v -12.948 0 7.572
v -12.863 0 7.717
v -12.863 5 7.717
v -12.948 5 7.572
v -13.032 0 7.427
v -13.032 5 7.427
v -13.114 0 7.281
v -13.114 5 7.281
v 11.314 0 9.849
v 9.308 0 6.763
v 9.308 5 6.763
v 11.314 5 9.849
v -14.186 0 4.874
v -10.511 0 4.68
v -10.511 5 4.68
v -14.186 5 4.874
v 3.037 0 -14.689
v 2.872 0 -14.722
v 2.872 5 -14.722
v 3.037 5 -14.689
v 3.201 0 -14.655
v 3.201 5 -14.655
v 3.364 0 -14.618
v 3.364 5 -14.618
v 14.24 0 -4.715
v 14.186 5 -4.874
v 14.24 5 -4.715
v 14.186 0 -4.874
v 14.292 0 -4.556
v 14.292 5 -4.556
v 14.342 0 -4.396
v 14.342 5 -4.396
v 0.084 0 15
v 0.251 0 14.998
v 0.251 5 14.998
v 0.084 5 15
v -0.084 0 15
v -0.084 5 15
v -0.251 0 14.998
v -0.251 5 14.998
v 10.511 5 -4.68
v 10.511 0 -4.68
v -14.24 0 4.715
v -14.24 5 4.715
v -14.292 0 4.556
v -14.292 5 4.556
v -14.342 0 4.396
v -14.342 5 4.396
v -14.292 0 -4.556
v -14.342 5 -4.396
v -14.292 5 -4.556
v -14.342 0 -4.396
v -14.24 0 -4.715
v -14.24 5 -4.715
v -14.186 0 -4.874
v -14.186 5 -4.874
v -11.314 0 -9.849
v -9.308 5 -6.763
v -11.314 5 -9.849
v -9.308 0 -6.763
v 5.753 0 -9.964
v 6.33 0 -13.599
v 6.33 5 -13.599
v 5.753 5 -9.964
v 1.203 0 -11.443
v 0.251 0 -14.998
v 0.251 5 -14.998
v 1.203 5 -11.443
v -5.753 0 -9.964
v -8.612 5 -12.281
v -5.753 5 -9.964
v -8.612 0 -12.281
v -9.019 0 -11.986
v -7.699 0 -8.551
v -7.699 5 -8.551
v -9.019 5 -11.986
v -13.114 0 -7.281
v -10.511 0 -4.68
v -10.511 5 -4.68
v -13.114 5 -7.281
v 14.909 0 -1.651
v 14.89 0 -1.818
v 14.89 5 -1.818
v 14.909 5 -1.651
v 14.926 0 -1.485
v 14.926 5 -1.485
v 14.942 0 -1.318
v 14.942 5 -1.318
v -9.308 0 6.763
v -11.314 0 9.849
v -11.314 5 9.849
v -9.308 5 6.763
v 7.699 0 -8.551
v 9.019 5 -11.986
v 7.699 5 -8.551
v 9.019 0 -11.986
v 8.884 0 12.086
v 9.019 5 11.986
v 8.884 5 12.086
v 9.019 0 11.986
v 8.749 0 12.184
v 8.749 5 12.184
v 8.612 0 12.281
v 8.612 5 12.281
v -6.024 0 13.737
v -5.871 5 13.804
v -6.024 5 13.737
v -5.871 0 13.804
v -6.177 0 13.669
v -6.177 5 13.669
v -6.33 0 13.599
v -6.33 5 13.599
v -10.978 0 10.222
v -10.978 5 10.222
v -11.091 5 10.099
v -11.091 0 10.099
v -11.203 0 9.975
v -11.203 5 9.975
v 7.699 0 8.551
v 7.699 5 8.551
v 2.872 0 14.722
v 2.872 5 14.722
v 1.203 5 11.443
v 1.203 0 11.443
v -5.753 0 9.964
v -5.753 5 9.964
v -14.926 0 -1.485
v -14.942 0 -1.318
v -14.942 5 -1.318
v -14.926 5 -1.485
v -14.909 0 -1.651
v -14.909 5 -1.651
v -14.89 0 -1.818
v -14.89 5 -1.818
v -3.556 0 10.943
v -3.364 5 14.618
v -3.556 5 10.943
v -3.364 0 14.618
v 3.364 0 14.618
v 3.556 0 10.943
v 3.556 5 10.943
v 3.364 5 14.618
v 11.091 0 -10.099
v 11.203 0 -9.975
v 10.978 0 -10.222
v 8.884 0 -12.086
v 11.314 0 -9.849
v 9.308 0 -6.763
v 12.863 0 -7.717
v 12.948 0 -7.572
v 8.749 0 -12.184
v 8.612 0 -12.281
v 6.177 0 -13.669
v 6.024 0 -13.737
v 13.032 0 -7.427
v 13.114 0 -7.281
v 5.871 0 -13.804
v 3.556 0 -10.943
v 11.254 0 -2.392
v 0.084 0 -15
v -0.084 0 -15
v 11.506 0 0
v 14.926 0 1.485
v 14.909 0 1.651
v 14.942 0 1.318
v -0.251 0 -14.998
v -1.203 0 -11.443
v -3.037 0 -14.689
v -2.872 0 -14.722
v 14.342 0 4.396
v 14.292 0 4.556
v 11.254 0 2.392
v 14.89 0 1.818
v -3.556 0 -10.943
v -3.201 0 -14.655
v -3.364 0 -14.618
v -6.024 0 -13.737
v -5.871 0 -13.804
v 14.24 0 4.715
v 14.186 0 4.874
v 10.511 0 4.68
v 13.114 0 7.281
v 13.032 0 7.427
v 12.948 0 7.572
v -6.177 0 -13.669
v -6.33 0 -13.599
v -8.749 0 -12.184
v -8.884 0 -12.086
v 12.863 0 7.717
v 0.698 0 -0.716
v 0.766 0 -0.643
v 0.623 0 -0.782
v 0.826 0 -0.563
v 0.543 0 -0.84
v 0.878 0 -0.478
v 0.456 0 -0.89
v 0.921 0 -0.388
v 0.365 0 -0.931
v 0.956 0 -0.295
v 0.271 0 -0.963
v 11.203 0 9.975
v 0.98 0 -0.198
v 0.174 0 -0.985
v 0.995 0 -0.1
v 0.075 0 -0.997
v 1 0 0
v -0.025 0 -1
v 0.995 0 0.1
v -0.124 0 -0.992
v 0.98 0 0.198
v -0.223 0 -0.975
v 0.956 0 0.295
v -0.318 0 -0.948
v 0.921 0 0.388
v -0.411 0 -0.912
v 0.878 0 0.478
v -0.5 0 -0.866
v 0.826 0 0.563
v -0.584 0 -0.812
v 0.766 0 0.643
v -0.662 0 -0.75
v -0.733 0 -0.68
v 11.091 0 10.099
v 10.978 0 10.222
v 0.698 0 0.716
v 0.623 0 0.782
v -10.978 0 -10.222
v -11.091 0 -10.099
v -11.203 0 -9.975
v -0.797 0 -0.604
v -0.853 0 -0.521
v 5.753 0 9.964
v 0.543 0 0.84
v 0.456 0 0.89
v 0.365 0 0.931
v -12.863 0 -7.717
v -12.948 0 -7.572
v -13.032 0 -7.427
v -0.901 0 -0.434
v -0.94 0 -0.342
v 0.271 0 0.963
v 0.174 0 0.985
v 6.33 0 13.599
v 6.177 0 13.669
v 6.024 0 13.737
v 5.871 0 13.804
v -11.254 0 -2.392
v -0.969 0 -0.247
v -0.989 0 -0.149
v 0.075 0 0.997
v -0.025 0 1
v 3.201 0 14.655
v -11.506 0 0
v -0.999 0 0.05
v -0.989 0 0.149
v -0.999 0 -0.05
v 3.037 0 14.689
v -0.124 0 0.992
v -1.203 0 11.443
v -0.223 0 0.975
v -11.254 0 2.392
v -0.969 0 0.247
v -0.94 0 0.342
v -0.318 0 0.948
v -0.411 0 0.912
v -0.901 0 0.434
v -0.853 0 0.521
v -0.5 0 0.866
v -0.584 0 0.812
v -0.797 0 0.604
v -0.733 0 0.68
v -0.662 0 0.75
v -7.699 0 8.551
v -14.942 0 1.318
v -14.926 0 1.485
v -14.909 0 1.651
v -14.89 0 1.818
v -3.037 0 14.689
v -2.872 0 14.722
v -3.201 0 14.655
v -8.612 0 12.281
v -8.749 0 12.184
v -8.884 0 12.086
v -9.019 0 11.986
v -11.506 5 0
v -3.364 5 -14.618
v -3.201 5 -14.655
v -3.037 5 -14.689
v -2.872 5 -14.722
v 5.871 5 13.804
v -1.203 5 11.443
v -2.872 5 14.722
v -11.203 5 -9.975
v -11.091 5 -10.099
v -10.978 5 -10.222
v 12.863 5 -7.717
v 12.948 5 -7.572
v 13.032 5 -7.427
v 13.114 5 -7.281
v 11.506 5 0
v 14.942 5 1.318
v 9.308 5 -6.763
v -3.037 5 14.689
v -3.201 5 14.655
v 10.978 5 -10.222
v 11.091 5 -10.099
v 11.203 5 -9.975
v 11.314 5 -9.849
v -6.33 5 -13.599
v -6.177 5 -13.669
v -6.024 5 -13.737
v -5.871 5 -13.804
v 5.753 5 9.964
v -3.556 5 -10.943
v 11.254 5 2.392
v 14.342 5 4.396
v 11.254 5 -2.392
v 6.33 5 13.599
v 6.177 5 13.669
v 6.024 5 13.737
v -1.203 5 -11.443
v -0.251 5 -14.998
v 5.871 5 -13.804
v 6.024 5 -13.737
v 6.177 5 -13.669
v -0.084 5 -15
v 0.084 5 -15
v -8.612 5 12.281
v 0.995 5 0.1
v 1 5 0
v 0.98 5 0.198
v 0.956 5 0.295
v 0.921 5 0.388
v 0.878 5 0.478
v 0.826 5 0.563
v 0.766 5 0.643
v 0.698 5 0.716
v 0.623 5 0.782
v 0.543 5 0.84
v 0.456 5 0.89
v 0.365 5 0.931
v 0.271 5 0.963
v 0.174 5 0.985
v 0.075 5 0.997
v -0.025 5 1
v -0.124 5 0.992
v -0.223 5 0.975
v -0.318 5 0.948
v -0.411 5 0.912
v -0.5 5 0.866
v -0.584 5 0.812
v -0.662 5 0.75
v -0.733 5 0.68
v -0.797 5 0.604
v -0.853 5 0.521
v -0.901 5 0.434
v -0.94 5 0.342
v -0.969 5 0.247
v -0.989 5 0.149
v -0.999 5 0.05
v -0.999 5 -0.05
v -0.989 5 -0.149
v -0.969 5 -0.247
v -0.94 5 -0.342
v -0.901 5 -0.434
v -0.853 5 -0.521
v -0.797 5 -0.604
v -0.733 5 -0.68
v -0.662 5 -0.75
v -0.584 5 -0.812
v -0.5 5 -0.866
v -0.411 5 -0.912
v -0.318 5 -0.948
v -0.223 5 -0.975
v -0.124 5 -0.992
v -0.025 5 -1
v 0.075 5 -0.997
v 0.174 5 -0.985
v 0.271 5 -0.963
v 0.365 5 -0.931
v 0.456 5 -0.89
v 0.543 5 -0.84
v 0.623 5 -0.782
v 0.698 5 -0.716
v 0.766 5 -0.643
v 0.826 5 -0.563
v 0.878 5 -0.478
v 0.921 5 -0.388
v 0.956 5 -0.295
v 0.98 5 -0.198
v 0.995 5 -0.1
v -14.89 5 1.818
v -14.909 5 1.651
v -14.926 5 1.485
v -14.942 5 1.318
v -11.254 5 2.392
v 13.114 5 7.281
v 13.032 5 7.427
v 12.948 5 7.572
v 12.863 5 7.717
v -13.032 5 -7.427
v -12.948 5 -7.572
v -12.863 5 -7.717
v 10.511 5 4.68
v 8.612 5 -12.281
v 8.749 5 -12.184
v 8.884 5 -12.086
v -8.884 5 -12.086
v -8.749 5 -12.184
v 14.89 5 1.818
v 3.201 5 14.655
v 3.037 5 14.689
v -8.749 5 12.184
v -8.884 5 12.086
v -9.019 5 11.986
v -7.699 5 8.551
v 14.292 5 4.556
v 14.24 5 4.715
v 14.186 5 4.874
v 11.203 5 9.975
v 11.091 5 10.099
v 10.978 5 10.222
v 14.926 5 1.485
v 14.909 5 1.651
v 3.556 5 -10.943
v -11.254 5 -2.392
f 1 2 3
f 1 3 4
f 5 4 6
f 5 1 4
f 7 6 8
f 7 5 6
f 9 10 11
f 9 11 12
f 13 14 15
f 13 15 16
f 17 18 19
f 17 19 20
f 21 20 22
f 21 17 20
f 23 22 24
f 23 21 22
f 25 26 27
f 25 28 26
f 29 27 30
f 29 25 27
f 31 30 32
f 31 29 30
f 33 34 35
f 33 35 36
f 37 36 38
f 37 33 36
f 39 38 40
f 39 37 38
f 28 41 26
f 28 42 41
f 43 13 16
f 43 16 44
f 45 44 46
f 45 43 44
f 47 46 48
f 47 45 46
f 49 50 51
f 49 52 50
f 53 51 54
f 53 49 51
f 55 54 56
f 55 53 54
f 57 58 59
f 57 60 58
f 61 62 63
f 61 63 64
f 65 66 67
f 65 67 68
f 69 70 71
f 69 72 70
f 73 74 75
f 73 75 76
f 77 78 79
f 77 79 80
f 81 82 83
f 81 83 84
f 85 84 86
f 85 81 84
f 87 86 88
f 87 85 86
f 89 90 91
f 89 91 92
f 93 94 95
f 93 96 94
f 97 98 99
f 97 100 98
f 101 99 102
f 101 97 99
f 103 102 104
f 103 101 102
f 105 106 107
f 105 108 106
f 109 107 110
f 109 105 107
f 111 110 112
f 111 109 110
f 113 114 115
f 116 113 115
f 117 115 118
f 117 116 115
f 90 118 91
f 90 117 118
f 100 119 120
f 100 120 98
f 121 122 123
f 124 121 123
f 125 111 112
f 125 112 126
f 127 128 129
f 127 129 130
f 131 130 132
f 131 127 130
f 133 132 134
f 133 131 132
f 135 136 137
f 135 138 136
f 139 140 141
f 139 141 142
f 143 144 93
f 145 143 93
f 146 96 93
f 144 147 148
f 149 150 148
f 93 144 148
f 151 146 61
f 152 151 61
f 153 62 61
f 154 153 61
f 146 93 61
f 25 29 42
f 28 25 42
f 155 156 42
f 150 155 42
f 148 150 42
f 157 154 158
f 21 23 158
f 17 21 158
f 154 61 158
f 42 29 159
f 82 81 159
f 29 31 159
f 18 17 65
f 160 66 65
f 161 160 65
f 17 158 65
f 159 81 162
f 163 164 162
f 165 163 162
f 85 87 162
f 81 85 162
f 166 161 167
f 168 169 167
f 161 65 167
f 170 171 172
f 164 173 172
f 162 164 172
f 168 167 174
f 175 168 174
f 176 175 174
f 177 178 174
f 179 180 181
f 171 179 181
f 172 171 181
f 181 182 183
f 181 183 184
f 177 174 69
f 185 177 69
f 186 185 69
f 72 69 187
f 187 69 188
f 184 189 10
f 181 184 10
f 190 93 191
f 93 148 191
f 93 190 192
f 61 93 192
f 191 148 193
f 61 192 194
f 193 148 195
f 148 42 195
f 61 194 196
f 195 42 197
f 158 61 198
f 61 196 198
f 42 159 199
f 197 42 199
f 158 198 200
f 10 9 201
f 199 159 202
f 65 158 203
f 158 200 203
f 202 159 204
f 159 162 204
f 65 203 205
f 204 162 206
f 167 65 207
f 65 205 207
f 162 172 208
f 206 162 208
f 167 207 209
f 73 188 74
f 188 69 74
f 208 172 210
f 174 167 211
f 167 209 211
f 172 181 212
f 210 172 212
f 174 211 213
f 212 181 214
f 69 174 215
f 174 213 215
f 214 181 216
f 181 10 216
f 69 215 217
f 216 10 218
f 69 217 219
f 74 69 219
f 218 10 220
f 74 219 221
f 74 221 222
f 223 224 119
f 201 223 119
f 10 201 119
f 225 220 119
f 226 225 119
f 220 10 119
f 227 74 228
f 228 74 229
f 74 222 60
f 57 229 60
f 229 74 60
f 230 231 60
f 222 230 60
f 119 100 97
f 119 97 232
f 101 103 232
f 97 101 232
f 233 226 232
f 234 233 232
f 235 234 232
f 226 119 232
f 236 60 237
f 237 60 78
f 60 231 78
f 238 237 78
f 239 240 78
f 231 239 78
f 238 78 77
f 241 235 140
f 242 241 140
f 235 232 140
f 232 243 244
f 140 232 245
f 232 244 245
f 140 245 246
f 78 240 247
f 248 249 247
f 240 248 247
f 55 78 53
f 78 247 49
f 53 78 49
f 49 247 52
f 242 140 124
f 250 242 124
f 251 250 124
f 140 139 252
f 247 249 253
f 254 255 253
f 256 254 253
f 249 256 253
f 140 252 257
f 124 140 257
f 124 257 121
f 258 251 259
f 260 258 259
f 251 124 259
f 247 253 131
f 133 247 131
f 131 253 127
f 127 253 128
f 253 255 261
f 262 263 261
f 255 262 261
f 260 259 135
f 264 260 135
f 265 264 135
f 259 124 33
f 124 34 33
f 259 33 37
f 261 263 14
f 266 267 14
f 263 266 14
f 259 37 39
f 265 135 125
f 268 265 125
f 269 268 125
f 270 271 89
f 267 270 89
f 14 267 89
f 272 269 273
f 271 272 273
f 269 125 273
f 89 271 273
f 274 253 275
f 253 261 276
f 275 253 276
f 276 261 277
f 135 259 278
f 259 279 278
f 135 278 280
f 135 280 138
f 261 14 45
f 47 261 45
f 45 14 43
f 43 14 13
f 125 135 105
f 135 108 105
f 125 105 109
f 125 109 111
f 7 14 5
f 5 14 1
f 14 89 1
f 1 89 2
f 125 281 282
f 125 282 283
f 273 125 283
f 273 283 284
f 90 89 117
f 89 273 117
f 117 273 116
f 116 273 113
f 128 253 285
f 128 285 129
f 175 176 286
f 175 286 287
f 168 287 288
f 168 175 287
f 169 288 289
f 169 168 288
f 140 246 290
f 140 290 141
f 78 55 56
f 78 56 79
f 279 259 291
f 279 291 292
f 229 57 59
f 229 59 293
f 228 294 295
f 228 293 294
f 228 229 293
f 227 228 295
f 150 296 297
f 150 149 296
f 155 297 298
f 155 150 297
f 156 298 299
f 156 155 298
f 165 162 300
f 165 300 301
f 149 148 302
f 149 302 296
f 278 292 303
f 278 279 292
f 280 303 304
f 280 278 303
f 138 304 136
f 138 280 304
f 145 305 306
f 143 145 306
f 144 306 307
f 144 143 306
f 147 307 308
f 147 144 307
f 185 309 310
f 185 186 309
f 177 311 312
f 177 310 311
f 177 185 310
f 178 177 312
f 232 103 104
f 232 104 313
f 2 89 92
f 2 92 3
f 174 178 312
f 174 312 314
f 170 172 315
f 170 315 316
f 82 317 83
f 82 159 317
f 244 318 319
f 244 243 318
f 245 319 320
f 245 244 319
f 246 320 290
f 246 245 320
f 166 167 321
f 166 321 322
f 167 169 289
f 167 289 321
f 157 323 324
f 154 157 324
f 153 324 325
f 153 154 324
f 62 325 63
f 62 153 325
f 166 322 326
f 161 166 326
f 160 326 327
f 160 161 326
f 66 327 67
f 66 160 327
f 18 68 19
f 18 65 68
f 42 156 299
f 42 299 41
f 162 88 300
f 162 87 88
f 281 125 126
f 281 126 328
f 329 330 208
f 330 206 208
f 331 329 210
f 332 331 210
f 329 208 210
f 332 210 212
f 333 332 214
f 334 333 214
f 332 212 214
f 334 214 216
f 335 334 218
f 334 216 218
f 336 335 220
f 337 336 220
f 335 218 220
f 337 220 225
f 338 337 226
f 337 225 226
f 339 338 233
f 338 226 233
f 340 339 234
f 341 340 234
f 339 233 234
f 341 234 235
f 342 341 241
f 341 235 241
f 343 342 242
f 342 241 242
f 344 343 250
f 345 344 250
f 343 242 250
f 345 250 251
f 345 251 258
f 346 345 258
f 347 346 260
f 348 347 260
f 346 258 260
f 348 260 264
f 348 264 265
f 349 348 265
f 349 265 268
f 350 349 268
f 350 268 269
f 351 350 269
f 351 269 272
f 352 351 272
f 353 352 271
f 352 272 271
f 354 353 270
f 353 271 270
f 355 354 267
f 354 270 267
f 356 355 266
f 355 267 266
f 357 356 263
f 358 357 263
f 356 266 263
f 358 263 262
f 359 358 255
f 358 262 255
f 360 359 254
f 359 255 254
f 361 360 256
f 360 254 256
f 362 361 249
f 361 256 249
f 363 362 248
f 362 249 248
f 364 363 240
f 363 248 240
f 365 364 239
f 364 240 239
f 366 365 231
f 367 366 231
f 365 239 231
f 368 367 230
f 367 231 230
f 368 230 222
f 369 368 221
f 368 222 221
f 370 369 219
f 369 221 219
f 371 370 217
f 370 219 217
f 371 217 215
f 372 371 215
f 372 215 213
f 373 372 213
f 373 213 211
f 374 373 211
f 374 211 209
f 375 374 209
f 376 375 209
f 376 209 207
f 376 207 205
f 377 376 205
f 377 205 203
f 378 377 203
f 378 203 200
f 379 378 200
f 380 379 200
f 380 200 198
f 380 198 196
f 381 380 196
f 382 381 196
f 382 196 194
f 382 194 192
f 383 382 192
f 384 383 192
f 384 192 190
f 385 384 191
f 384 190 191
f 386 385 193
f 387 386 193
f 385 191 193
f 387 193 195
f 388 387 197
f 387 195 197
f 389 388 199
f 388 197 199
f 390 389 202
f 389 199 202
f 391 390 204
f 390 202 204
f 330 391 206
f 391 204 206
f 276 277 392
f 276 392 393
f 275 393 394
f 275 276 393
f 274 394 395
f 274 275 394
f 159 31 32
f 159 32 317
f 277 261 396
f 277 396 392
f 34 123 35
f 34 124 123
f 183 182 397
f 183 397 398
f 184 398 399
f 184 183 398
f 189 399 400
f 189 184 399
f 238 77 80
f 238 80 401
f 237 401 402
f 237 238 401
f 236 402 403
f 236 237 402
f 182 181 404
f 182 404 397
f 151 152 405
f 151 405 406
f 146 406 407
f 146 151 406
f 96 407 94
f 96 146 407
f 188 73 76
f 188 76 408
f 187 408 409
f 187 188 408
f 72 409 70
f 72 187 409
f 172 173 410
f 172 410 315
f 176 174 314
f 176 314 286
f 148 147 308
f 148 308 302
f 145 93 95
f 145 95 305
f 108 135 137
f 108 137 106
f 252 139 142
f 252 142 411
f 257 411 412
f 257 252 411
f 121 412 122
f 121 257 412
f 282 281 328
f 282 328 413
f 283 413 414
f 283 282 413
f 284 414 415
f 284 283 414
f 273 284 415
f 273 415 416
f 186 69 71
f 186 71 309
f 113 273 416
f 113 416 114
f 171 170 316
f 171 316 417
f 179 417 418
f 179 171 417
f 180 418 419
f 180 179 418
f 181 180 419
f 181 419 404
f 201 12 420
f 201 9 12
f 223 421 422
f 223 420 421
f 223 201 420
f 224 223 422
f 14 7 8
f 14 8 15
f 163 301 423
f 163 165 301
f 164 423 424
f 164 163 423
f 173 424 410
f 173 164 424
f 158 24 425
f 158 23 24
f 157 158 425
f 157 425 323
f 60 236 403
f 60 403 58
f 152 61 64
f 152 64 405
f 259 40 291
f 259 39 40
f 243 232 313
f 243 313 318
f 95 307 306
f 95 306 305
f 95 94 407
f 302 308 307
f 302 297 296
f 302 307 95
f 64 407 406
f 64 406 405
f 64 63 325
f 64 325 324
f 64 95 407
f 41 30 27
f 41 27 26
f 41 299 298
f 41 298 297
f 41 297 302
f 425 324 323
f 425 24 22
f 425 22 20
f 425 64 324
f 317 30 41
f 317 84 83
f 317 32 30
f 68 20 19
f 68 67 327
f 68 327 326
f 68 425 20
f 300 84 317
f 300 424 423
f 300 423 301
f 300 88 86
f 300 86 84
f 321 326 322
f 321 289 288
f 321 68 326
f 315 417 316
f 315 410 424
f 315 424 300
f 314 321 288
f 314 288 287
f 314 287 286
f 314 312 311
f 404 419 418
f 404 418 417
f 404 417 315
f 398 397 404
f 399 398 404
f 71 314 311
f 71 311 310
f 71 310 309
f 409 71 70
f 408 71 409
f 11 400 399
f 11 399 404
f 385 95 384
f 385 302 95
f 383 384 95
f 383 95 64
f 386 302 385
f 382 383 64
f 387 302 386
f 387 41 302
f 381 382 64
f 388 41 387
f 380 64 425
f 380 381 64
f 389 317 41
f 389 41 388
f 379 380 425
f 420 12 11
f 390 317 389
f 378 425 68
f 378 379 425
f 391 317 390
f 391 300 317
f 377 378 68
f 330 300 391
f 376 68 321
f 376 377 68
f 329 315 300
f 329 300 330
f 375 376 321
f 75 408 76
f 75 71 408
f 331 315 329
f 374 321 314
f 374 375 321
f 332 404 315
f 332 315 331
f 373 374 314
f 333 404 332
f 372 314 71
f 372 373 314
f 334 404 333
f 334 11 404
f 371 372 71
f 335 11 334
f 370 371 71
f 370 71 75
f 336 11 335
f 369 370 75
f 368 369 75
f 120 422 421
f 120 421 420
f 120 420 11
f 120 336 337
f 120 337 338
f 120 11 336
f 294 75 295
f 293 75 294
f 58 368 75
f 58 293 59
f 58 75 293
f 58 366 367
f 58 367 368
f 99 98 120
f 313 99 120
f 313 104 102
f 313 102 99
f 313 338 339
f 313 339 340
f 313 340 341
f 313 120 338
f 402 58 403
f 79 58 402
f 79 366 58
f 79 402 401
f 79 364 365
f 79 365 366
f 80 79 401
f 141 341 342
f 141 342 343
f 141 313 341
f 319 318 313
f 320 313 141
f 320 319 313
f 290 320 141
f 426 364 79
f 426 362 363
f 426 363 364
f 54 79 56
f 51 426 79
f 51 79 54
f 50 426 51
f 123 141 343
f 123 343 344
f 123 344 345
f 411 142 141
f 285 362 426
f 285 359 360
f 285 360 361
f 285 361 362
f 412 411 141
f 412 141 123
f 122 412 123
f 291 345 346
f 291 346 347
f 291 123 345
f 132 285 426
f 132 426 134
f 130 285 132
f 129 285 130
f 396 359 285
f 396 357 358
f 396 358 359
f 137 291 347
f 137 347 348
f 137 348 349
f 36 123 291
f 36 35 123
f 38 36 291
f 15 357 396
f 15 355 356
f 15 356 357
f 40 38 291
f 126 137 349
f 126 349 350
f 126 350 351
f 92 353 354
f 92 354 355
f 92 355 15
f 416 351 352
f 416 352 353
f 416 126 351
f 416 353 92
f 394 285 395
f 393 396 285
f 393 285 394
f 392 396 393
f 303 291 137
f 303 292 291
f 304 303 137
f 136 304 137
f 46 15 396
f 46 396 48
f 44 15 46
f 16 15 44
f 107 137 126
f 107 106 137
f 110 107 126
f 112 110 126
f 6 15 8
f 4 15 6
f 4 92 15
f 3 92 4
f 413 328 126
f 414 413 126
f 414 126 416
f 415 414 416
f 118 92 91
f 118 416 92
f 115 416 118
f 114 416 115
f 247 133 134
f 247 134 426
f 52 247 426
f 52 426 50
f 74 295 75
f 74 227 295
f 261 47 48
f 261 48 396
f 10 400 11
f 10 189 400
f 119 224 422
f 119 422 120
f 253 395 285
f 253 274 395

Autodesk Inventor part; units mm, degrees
ref_plane "YZ Plane" through (0, 0, 0) normal (1, 0, 0) x (0, 1, 0)
ref_plane "XZ Plane" through (0, 0, 0) normal (0, 1, 0) x (-1, 0, 0)
ref_plane "XY Plane" through (0, 0, 0) normal (0, 0, 1) x (1, 0, 0)
sketch "Sketch1" plane through (0, 0, 0) normal (0, 1, 0) x (-1, 0, 0)
  circle A0 centre (0, 0) radius 15
  line L0 (14.942, 1.3178) -> (11.506, 0)
  line L1 (11.506, 0) -> (14.942, -1.3178)
  line L2 (14.3415, 4.3956) -> (11.2545, 2.3922)
  line L3 (11.2545, 2.3922) -> (14.8895, 1.8176)
  line L4 (13.1142, 7.2813) -> (10.5112, 4.6799)
  line L5 (10.5112, 4.6799) -> (14.1862, 4.8736)
  line L6 (11.3137, 9.8488) -> (9.3085, 6.763)
  line L7 (9.3085, 6.763) -> (12.8629, 7.7166)
  line L8 (9.0188, 11.9859) -> (7.699, 8.5506)
  line L9 (7.699, 8.5506) -> (10.9775, 10.2223)
  line L10 (6.3297, 13.5991) -> (5.753, 9.9645)
  line L11 (5.753, 9.9645) -> (8.6123, 12.2812)
  line L12 (3.364, 14.6179) -> (3.5555, 10.9428)
  line L13 (3.5555, 10.9428) -> (5.8706, 13.8035)
  line L14 (0.2513, 14.9979) -> (1.2027, 11.4429)
  line L15 (1.2027, 11.4429) -> (2.8725, 14.7224)
  line L16 (-2.8725, 14.7224) -> (-1.2027, 11.4429)
  line L17 (-1.2027, 11.4429) -> (-0.2513, 14.9979)
  line L18 (-5.8706, 13.8035) -> (-3.5555, 10.9428)
  line L19 (-3.5555, 10.9428) -> (-3.364, 14.6179)
  line L20 (-8.6123, 12.2812) -> (-5.753, 9.9645)
  line L21 (-5.753, 9.9645) -> (-6.3297, 13.5991)
  line L22 (-10.9775, 10.2223) -> (-7.699, 8.5506)
  line L23 (-7.699, 8.5506) -> (-9.0188, 11.9859)
  line L24 (-12.8629, 7.7166) -> (-9.3085, 6.763)
  line L25 (-9.3085, 6.763) -> (-11.3137, 9.8488)
  line L26 (-14.1862, 4.8736) -> (-10.5112, 4.6799)
  line L27 (-10.5112, 4.6799) -> (-13.1142, 7.2813)
  line L28 (-14.8895, 1.8176) -> (-11.2545, 2.3922)
  line L29 (-11.2545, 2.3922) -> (-14.3415, 4.3956)
  line L30 (-14.942, -1.3178) -> (-11.506, 0)
  line L31 (-11.506, 0) -> (-14.942, 1.3178)
  line L32 (-14.3415, -4.3956) -> (-11.2545, -2.3922)
  line L33 (-11.2545, -2.3922) -> (-14.8895, -1.8176)
  line L34 (-13.1142, -7.2813) -> (-10.5112, -4.6799)
  line L35 (-10.5112, -4.6799) -> (-14.1862, -4.8736)
  line L36 (-11.3137, -9.8488) -> (-9.3085, -6.763)
  line L37 (-9.3085, -6.763) -> (-12.8629, -7.7166)
  line L38 (-9.0188, -11.9859) -> (-7.699, -8.5506)
  line L39 (-7.699, -8.5506) -> (-10.9775, -10.2223)
  line L40 (-6.3297, -13.5991) -> (-5.753, -9.9645)
  line L41 (-5.753, -9.9645) -> (-8.6123, -12.2812)
  line L42 (-3.364, -14.6179) -> (-3.5555, -10.9428)
  line L43 (-3.5555, -10.9428) -> (-5.8706, -13.8035)
  line L44 (-0.2513, -14.9979) -> (-1.2027, -11.4429)
  line L45 (-1.2027, -11.4429) -> (-2.8725, -14.7224)
  line L46 (2.8725, -14.7224) -> (1.2027, -11.4429)
  line L47 (1.2027, -11.4429) -> (0.2513, -14.9979)
  line L48 (5.8706, -13.8035) -> (3.5555, -10.9428)
  line L49 (3.5555, -10.9428) -> (3.364, -14.6179)
  line L50 (8.6123, -12.2812) -> (5.753, -9.9645)
  line L51 (5.753, -9.9645) -> (6.3297, -13.5991)
  line L52 (10.9775, -10.2223) -> (7.699, -8.5506)
  line L53 (7.699, -8.5506) -> (9.0188, -11.9859)
  line L54 (12.8629, -7.7166) -> (9.3085, -6.763)
  line L55 (9.3085, -6.763) -> (11.3137, -9.8488)
  line L56 (14.1862, -4.8736) -> (10.5112, -4.6799)
  line L57 (10.5112, -4.6799) -> (13.1142, -7.2813)
  line L58 (14.8895, -1.8176) -> (11.2545, -2.3922)
  line L59 (11.2545, -2.3922) -> (14.3415, -4.3956)
  dimension "d0" = 30
  dimension "d3" = 360
extrude "Extrusion1" add sketch "Sketch1" along normal blind 5 contours L0 L1 A0 L58 L59 L56 L57 L54 L55 L52 L53 L50 L51 L48 L49 L46 L47 L44 L45 L42 L43 L40 L41 L38 L39 L36 L37 L34 L35 L32 L33 L30 L31 L28 L29 L26 L27 L24 L25 L22 L23 L20 L21 L18 L19 L16 L17 L14 L15 L12 L13 L10 L11 L8 L9 L6 L7 L4 L5 L2 L3
sketch "Sketch4" plane through (0, 0, 0) normal (0, -1, 0) x (1, 0, 0)
  circle A0 centre (0, 0) radius 1
  dimension "d17" = 2
extrude "Extrusion4" cut sketch "Sketch4" against normal blind 10
properties part number "30ToothGear"
